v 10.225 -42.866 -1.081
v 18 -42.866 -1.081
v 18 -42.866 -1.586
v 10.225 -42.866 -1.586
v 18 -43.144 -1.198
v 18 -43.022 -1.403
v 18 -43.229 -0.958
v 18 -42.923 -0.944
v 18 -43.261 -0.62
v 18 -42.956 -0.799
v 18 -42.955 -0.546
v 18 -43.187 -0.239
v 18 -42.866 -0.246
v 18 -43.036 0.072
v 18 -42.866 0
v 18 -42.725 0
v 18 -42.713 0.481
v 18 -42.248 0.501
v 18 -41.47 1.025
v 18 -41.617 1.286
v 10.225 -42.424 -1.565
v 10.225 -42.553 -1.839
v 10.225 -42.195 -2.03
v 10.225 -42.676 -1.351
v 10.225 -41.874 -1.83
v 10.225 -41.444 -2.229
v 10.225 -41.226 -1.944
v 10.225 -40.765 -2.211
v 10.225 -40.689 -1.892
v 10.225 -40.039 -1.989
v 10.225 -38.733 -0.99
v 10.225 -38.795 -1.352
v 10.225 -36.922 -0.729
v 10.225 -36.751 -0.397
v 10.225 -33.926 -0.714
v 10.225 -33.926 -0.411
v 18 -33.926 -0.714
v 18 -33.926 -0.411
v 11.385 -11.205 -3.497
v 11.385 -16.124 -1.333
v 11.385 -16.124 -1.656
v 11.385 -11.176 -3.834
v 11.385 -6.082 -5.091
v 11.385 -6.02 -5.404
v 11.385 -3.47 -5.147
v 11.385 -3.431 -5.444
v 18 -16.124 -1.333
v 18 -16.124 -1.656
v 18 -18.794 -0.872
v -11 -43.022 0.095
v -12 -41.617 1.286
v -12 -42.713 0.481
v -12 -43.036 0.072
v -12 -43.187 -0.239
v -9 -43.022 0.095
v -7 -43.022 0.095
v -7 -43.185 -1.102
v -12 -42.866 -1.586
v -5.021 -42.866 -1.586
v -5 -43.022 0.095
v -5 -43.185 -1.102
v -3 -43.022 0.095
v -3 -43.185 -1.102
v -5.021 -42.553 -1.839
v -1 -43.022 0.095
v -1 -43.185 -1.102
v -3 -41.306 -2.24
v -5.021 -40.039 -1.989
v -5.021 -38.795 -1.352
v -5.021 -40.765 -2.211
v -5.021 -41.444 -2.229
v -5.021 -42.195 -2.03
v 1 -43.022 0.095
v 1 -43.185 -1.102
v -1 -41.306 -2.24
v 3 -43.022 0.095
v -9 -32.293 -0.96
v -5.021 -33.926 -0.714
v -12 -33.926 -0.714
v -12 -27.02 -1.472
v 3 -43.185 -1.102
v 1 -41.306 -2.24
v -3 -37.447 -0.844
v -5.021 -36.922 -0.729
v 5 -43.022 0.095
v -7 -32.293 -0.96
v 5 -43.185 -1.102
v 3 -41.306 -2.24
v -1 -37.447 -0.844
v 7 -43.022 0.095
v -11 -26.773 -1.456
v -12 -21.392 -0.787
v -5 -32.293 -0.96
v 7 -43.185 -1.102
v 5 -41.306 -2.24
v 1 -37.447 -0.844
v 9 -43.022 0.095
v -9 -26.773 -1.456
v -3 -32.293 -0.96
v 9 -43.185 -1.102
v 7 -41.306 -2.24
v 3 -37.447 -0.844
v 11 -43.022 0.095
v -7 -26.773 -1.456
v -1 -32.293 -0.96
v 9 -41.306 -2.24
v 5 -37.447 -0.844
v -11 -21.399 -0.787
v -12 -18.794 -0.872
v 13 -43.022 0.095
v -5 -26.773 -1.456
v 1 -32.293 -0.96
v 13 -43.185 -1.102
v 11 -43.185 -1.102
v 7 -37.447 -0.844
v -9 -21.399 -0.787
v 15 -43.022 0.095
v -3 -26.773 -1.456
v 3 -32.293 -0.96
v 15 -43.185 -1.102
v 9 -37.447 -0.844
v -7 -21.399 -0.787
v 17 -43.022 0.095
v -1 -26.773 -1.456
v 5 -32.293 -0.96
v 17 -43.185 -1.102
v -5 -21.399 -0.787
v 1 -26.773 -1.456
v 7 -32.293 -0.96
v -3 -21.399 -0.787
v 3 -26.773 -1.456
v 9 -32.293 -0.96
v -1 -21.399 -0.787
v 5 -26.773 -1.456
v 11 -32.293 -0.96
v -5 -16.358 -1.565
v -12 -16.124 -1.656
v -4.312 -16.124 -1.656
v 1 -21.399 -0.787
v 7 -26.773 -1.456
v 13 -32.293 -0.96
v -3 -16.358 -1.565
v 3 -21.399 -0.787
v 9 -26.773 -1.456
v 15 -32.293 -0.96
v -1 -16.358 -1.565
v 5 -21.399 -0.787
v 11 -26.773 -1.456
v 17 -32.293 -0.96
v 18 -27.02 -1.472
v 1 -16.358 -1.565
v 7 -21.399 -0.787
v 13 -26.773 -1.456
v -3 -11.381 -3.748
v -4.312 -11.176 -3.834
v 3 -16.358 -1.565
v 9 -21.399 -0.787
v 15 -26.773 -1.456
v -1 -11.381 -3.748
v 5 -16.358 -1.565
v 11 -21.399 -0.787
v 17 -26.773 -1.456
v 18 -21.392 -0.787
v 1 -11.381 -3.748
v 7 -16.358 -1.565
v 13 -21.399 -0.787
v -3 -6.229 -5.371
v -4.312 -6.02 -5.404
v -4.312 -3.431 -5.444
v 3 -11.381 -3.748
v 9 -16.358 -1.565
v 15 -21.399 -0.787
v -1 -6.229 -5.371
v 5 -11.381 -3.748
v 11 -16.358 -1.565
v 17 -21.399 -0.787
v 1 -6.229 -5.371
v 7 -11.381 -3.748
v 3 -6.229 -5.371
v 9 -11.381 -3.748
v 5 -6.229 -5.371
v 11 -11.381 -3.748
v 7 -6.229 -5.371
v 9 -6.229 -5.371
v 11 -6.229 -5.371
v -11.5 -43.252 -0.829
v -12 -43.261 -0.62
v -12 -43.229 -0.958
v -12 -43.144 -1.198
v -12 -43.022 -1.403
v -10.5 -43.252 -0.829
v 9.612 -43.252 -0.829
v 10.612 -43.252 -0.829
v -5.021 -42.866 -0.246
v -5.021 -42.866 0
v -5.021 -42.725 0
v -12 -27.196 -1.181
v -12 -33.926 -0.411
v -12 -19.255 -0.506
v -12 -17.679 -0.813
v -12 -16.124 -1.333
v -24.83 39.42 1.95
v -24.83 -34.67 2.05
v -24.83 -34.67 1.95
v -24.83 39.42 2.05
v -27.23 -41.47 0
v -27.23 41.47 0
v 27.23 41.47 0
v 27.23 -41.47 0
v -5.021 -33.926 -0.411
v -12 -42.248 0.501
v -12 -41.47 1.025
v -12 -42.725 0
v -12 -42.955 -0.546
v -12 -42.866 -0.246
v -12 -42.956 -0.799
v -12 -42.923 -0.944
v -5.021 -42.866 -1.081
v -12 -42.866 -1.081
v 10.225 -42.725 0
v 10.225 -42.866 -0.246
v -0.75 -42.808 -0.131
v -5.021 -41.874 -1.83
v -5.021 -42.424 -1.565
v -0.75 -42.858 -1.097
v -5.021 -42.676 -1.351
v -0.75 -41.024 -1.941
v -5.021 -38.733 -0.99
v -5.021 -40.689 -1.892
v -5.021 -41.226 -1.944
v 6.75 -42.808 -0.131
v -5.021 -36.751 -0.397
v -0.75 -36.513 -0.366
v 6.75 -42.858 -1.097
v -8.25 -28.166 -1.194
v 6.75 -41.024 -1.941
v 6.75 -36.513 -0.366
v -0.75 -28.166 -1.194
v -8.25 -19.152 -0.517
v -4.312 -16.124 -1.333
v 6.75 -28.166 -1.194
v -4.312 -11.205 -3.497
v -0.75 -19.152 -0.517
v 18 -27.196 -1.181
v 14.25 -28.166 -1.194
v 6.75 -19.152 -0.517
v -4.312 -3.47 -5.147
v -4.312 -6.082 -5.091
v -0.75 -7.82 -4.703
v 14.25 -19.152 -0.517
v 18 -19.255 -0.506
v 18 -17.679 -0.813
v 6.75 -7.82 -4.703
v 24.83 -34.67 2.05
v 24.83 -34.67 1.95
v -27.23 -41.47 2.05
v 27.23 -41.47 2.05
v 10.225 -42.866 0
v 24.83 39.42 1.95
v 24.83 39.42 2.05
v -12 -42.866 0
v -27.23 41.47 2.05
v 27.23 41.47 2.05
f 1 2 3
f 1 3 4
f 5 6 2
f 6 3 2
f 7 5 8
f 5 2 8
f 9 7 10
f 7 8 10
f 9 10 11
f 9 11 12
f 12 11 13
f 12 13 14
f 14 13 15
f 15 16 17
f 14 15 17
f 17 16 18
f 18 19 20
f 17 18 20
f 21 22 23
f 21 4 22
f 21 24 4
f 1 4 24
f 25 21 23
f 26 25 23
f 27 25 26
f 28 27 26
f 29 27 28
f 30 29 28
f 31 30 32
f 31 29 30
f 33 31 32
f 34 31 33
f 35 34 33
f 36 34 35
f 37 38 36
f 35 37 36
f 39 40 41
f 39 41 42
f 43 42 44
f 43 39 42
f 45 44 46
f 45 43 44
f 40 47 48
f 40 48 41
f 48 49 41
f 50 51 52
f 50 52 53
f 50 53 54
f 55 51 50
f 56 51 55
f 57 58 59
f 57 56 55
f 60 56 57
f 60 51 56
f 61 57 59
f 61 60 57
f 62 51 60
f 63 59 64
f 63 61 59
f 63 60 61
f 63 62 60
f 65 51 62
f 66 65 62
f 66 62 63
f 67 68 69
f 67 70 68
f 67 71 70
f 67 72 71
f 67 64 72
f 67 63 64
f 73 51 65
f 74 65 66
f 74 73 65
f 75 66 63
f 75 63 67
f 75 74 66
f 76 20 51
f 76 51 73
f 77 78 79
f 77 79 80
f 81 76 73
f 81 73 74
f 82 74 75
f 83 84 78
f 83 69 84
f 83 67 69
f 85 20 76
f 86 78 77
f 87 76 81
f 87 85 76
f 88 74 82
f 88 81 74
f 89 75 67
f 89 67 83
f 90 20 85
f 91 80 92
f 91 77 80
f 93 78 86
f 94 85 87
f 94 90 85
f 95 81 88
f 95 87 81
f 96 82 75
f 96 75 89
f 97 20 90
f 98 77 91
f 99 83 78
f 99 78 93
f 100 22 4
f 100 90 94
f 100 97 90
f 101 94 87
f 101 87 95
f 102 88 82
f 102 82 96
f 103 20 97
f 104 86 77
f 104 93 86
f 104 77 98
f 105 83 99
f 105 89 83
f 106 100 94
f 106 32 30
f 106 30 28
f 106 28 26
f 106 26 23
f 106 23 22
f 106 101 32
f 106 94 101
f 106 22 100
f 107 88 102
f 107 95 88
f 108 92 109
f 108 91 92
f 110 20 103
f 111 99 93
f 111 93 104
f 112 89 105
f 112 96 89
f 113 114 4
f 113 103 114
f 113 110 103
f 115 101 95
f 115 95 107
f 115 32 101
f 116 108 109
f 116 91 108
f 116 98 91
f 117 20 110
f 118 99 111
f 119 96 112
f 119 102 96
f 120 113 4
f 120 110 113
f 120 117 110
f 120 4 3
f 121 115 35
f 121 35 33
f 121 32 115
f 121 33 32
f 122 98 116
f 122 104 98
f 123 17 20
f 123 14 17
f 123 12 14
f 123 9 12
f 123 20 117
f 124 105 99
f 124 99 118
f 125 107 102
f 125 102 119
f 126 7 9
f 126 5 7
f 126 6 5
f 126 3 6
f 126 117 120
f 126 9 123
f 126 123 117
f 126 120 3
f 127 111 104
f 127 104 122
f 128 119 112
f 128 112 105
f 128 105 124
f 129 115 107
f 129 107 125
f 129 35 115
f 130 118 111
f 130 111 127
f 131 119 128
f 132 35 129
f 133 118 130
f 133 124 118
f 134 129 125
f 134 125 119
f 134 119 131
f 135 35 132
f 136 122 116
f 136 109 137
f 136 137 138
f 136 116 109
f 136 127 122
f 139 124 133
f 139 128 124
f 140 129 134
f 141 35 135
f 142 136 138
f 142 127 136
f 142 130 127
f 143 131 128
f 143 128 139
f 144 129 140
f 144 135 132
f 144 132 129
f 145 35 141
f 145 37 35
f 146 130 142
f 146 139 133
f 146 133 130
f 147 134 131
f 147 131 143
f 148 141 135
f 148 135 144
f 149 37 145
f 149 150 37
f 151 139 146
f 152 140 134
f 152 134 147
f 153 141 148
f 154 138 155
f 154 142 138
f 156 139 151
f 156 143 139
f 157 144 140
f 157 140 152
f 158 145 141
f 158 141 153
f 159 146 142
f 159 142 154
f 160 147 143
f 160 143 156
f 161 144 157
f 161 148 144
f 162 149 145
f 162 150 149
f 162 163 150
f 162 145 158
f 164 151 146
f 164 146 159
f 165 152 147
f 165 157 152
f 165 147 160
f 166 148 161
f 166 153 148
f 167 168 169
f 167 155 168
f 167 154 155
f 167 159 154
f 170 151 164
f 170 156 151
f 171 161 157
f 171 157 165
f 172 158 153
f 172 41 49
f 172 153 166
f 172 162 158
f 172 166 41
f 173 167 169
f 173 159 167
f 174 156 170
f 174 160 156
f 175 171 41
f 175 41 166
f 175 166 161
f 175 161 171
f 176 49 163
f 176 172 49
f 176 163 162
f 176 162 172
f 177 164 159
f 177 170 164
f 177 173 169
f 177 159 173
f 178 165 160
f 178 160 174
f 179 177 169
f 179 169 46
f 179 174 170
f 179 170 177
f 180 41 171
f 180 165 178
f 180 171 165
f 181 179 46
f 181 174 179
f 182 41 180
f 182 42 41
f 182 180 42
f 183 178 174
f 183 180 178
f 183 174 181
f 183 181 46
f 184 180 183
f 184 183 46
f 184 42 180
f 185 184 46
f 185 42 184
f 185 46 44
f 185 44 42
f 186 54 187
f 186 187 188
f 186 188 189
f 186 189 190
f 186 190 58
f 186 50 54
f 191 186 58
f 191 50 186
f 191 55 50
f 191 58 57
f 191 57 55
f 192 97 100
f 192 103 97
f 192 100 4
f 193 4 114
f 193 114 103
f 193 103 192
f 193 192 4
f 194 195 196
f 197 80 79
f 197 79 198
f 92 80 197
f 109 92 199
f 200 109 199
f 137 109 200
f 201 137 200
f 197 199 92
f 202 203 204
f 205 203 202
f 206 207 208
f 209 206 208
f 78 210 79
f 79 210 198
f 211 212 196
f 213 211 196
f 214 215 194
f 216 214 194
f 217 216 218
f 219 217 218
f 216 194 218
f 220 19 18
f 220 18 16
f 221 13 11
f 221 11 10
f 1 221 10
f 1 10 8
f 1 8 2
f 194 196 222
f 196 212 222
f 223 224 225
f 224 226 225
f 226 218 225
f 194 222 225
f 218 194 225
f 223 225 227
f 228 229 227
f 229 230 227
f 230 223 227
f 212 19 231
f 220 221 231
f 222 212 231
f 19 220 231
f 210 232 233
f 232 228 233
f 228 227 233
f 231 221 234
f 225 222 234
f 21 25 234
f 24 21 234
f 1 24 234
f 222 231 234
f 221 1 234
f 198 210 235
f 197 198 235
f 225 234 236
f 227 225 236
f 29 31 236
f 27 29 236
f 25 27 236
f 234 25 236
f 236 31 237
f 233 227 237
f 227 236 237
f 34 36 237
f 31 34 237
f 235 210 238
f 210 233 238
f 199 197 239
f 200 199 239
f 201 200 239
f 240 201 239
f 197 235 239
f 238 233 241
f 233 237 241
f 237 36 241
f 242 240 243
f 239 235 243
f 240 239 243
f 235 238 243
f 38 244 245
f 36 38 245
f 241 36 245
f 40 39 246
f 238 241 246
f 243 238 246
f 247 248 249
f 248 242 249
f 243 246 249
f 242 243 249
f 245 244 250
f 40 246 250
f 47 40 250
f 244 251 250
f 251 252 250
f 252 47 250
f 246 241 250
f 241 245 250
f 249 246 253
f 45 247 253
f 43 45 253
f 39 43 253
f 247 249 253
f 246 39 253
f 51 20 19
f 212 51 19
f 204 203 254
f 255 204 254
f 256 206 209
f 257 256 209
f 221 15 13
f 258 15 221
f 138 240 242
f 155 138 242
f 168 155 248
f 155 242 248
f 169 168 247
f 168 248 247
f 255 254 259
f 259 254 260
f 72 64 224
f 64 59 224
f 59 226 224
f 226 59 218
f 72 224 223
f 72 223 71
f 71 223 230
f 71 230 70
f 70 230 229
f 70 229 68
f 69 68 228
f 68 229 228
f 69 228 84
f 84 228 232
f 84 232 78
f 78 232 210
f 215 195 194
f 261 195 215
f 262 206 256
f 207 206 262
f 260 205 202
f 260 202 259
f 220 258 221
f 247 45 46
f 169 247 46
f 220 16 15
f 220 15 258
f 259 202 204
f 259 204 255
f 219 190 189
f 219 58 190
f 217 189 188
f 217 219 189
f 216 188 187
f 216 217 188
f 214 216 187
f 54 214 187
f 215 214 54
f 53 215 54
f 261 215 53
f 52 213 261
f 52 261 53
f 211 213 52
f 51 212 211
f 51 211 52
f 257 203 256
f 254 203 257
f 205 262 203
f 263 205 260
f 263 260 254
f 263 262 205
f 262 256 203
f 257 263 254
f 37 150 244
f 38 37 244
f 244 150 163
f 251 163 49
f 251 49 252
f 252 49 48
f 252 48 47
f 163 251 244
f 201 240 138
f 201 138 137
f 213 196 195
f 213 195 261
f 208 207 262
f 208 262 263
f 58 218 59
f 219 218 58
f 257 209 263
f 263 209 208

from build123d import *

# Parameters (mm, degrees)
SKETCH_1_W          = 54.46
SKETCH_1_H          = 82.94
EXTRUDE_1_DEPTH     = 2.05
SKETCH_2_W          = 49.66
SKETCH_2_H          = 74.09
CUT_EXTRUDE_1_DEPTH = 0.1
EXTRUDE_3_DEPTH     = 30
SKETCH_8_W          = 6.614912747
SKETCH_8_H          = 12.711315131
SKETCH_8_W_2        = 7.688185389
SKETCH_8_H_2        = 12.692983113
SKETCH_8_W_3        = 6.978944135
SKETCH_8_H_3        = 8.940227215
SKETCH_8_W_4        = 7.775121352
CUT_EXTRUDE_4_DEPTH = 30


with BuildPart() as part:
    # 草图1 → 凸台-拉伸1 (new body)
    with BuildSketch(Plane.XY):
        Rectangle(SKETCH_1_W, SKETCH_1_H)
    extrude(amount=EXTRUDE_1_DEPTH)

    # 草图2 → 切除-拉伸1 (cut)
    with BuildSketch(Plane.XY.offset(2.05)):
        with Locations((0, 2.375)):
            Rectangle(SKETCH_2_W, SKETCH_2_H)
    extrude(amount=-CUT_EXTRUDE_1_DEPTH, mode=Mode.SUBTRACT)


with BuildPart() as body_2:
    # 草图7 → 凸台-拉伸3 (new body)
    with BuildSketch(Plane(origin=(18, 0, 0), x_dir=(0, 0, -1), z_dir=(1, 0, 0))):
        with BuildLine():
            Line((5.146552874, -3.47), (5.444020563, -3.431103035))
            add(Edge.make_bspline(
                [(-1.286297274, -41.617389736), (-1.223587325, -41.728563955), (-1.088033939, -41.954770225), (-0.827169864, -42.33511155), (-0.496595202, -42.721851198), (-0.096719678, -43.043667166), (0.449458325, -43.298879387), (1.140273171, -43.257430936), (1.739673196, -42.77212046), (2.112797921, -42.08995031), (2.283153908, -41.305573434), (2.196921491, -40.525373684), (1.919357435, -39.854162671), (1.578844311, -39.240339327), (1.173173818, -38.460506981), (0.802886094, -37.450137111), (0.605911538, -36.21752602), (0.60041949, -34.517551684), (0.943173643, -32.30751937), (1.37059894, -30.023283722), (1.520340398, -28.162909769), (1.45720112, -26.305484226), (1.118605039, -24.032494684), (0.716583543, -21.378403338), (0.739095108, -18.845877941), (1.503065232, -16.357755368), (2.638046298, -13.868210623), (3.77755363, -11.385375623), (4.741808939, -8.874044395), (5.343749283, -6.69224251), (5.545946119, -4.86546684), (5.505533179, -3.901525747), (5.444020563, -3.431103035)],
                knots=[0, 0, 0, 0, 0.00390625, 0.0078125, 0.015625, 0.0234375, 0.03125, 0.046875, 0.0625, 0.078125, 0.09375, 0.109375, 0.125, 0.140625, 0.15625, 0.1875, 0.21875, 0.25, 0.3125, 0.375, 0.40625, 0.4375, 0.5, 0.5625, 0.625, 0.6875, 0.75, 0.8125, 0.875, 0.9375, 0.96875, 1, 1, 1, 1], degree=3))
            Line((-1.286297274, -41.617389736), (-1.025, -41.47))
            add(Edge.make_bspline(
                [(-1.025, -41.47), (0.586135687, -44.326273264), (2.724437043, -41.577020469), (1.167092054, -39.243034526), (-0.474291884, -35.137676384), (2.41314287, -28.253237542), (-0.609973253, -19.940727833), (2.604118731, -13.342042381), (4.761345707, -8.325901773), (5.344389343, -4.982970422), (5.146552874, -3.47)],
                knots=[0, 0, 0, 0, 0.099779567, 0.147390068, 0.187617053, 0.406024613, 0.616638529, 0.763830123, 0.898120838, 1, 1, 1, 1], degree=3))
        make_face()
    extrude(amount=-EXTRUDE_3_DEPTH)

    # 草图8 → 切除-拉伸4 (cut)
    with BuildSketch(Plane(origin=(0, 0, 0), x_dir=(-1, 0, 0), z_dir=(0, 0, -1))):
        with Locations((-14.692543627, -9.768428583)):
            Rectangle(SKETCH_8_W, SKETCH_8_H)
        with Locations((8.155907305, -9.777594591)):
            Rectangle(SKETCH_8_W_2, SKETCH_8_H_2)
        with Locations((8.510527933, -38.396276724)):
            Rectangle(SKETCH_8_W_3, SKETCH_8_H_3)
        with Locations((-14.112439324, -38.396276724)):
            Rectangle(SKETCH_8_W_4, SKETCH_8_H_3)
    extrude(amount=CUT_EXTRUDE_4_DEPTH, mode=Mode.SUBTRACT)


solid = Compound([part.part, body_2.part])
